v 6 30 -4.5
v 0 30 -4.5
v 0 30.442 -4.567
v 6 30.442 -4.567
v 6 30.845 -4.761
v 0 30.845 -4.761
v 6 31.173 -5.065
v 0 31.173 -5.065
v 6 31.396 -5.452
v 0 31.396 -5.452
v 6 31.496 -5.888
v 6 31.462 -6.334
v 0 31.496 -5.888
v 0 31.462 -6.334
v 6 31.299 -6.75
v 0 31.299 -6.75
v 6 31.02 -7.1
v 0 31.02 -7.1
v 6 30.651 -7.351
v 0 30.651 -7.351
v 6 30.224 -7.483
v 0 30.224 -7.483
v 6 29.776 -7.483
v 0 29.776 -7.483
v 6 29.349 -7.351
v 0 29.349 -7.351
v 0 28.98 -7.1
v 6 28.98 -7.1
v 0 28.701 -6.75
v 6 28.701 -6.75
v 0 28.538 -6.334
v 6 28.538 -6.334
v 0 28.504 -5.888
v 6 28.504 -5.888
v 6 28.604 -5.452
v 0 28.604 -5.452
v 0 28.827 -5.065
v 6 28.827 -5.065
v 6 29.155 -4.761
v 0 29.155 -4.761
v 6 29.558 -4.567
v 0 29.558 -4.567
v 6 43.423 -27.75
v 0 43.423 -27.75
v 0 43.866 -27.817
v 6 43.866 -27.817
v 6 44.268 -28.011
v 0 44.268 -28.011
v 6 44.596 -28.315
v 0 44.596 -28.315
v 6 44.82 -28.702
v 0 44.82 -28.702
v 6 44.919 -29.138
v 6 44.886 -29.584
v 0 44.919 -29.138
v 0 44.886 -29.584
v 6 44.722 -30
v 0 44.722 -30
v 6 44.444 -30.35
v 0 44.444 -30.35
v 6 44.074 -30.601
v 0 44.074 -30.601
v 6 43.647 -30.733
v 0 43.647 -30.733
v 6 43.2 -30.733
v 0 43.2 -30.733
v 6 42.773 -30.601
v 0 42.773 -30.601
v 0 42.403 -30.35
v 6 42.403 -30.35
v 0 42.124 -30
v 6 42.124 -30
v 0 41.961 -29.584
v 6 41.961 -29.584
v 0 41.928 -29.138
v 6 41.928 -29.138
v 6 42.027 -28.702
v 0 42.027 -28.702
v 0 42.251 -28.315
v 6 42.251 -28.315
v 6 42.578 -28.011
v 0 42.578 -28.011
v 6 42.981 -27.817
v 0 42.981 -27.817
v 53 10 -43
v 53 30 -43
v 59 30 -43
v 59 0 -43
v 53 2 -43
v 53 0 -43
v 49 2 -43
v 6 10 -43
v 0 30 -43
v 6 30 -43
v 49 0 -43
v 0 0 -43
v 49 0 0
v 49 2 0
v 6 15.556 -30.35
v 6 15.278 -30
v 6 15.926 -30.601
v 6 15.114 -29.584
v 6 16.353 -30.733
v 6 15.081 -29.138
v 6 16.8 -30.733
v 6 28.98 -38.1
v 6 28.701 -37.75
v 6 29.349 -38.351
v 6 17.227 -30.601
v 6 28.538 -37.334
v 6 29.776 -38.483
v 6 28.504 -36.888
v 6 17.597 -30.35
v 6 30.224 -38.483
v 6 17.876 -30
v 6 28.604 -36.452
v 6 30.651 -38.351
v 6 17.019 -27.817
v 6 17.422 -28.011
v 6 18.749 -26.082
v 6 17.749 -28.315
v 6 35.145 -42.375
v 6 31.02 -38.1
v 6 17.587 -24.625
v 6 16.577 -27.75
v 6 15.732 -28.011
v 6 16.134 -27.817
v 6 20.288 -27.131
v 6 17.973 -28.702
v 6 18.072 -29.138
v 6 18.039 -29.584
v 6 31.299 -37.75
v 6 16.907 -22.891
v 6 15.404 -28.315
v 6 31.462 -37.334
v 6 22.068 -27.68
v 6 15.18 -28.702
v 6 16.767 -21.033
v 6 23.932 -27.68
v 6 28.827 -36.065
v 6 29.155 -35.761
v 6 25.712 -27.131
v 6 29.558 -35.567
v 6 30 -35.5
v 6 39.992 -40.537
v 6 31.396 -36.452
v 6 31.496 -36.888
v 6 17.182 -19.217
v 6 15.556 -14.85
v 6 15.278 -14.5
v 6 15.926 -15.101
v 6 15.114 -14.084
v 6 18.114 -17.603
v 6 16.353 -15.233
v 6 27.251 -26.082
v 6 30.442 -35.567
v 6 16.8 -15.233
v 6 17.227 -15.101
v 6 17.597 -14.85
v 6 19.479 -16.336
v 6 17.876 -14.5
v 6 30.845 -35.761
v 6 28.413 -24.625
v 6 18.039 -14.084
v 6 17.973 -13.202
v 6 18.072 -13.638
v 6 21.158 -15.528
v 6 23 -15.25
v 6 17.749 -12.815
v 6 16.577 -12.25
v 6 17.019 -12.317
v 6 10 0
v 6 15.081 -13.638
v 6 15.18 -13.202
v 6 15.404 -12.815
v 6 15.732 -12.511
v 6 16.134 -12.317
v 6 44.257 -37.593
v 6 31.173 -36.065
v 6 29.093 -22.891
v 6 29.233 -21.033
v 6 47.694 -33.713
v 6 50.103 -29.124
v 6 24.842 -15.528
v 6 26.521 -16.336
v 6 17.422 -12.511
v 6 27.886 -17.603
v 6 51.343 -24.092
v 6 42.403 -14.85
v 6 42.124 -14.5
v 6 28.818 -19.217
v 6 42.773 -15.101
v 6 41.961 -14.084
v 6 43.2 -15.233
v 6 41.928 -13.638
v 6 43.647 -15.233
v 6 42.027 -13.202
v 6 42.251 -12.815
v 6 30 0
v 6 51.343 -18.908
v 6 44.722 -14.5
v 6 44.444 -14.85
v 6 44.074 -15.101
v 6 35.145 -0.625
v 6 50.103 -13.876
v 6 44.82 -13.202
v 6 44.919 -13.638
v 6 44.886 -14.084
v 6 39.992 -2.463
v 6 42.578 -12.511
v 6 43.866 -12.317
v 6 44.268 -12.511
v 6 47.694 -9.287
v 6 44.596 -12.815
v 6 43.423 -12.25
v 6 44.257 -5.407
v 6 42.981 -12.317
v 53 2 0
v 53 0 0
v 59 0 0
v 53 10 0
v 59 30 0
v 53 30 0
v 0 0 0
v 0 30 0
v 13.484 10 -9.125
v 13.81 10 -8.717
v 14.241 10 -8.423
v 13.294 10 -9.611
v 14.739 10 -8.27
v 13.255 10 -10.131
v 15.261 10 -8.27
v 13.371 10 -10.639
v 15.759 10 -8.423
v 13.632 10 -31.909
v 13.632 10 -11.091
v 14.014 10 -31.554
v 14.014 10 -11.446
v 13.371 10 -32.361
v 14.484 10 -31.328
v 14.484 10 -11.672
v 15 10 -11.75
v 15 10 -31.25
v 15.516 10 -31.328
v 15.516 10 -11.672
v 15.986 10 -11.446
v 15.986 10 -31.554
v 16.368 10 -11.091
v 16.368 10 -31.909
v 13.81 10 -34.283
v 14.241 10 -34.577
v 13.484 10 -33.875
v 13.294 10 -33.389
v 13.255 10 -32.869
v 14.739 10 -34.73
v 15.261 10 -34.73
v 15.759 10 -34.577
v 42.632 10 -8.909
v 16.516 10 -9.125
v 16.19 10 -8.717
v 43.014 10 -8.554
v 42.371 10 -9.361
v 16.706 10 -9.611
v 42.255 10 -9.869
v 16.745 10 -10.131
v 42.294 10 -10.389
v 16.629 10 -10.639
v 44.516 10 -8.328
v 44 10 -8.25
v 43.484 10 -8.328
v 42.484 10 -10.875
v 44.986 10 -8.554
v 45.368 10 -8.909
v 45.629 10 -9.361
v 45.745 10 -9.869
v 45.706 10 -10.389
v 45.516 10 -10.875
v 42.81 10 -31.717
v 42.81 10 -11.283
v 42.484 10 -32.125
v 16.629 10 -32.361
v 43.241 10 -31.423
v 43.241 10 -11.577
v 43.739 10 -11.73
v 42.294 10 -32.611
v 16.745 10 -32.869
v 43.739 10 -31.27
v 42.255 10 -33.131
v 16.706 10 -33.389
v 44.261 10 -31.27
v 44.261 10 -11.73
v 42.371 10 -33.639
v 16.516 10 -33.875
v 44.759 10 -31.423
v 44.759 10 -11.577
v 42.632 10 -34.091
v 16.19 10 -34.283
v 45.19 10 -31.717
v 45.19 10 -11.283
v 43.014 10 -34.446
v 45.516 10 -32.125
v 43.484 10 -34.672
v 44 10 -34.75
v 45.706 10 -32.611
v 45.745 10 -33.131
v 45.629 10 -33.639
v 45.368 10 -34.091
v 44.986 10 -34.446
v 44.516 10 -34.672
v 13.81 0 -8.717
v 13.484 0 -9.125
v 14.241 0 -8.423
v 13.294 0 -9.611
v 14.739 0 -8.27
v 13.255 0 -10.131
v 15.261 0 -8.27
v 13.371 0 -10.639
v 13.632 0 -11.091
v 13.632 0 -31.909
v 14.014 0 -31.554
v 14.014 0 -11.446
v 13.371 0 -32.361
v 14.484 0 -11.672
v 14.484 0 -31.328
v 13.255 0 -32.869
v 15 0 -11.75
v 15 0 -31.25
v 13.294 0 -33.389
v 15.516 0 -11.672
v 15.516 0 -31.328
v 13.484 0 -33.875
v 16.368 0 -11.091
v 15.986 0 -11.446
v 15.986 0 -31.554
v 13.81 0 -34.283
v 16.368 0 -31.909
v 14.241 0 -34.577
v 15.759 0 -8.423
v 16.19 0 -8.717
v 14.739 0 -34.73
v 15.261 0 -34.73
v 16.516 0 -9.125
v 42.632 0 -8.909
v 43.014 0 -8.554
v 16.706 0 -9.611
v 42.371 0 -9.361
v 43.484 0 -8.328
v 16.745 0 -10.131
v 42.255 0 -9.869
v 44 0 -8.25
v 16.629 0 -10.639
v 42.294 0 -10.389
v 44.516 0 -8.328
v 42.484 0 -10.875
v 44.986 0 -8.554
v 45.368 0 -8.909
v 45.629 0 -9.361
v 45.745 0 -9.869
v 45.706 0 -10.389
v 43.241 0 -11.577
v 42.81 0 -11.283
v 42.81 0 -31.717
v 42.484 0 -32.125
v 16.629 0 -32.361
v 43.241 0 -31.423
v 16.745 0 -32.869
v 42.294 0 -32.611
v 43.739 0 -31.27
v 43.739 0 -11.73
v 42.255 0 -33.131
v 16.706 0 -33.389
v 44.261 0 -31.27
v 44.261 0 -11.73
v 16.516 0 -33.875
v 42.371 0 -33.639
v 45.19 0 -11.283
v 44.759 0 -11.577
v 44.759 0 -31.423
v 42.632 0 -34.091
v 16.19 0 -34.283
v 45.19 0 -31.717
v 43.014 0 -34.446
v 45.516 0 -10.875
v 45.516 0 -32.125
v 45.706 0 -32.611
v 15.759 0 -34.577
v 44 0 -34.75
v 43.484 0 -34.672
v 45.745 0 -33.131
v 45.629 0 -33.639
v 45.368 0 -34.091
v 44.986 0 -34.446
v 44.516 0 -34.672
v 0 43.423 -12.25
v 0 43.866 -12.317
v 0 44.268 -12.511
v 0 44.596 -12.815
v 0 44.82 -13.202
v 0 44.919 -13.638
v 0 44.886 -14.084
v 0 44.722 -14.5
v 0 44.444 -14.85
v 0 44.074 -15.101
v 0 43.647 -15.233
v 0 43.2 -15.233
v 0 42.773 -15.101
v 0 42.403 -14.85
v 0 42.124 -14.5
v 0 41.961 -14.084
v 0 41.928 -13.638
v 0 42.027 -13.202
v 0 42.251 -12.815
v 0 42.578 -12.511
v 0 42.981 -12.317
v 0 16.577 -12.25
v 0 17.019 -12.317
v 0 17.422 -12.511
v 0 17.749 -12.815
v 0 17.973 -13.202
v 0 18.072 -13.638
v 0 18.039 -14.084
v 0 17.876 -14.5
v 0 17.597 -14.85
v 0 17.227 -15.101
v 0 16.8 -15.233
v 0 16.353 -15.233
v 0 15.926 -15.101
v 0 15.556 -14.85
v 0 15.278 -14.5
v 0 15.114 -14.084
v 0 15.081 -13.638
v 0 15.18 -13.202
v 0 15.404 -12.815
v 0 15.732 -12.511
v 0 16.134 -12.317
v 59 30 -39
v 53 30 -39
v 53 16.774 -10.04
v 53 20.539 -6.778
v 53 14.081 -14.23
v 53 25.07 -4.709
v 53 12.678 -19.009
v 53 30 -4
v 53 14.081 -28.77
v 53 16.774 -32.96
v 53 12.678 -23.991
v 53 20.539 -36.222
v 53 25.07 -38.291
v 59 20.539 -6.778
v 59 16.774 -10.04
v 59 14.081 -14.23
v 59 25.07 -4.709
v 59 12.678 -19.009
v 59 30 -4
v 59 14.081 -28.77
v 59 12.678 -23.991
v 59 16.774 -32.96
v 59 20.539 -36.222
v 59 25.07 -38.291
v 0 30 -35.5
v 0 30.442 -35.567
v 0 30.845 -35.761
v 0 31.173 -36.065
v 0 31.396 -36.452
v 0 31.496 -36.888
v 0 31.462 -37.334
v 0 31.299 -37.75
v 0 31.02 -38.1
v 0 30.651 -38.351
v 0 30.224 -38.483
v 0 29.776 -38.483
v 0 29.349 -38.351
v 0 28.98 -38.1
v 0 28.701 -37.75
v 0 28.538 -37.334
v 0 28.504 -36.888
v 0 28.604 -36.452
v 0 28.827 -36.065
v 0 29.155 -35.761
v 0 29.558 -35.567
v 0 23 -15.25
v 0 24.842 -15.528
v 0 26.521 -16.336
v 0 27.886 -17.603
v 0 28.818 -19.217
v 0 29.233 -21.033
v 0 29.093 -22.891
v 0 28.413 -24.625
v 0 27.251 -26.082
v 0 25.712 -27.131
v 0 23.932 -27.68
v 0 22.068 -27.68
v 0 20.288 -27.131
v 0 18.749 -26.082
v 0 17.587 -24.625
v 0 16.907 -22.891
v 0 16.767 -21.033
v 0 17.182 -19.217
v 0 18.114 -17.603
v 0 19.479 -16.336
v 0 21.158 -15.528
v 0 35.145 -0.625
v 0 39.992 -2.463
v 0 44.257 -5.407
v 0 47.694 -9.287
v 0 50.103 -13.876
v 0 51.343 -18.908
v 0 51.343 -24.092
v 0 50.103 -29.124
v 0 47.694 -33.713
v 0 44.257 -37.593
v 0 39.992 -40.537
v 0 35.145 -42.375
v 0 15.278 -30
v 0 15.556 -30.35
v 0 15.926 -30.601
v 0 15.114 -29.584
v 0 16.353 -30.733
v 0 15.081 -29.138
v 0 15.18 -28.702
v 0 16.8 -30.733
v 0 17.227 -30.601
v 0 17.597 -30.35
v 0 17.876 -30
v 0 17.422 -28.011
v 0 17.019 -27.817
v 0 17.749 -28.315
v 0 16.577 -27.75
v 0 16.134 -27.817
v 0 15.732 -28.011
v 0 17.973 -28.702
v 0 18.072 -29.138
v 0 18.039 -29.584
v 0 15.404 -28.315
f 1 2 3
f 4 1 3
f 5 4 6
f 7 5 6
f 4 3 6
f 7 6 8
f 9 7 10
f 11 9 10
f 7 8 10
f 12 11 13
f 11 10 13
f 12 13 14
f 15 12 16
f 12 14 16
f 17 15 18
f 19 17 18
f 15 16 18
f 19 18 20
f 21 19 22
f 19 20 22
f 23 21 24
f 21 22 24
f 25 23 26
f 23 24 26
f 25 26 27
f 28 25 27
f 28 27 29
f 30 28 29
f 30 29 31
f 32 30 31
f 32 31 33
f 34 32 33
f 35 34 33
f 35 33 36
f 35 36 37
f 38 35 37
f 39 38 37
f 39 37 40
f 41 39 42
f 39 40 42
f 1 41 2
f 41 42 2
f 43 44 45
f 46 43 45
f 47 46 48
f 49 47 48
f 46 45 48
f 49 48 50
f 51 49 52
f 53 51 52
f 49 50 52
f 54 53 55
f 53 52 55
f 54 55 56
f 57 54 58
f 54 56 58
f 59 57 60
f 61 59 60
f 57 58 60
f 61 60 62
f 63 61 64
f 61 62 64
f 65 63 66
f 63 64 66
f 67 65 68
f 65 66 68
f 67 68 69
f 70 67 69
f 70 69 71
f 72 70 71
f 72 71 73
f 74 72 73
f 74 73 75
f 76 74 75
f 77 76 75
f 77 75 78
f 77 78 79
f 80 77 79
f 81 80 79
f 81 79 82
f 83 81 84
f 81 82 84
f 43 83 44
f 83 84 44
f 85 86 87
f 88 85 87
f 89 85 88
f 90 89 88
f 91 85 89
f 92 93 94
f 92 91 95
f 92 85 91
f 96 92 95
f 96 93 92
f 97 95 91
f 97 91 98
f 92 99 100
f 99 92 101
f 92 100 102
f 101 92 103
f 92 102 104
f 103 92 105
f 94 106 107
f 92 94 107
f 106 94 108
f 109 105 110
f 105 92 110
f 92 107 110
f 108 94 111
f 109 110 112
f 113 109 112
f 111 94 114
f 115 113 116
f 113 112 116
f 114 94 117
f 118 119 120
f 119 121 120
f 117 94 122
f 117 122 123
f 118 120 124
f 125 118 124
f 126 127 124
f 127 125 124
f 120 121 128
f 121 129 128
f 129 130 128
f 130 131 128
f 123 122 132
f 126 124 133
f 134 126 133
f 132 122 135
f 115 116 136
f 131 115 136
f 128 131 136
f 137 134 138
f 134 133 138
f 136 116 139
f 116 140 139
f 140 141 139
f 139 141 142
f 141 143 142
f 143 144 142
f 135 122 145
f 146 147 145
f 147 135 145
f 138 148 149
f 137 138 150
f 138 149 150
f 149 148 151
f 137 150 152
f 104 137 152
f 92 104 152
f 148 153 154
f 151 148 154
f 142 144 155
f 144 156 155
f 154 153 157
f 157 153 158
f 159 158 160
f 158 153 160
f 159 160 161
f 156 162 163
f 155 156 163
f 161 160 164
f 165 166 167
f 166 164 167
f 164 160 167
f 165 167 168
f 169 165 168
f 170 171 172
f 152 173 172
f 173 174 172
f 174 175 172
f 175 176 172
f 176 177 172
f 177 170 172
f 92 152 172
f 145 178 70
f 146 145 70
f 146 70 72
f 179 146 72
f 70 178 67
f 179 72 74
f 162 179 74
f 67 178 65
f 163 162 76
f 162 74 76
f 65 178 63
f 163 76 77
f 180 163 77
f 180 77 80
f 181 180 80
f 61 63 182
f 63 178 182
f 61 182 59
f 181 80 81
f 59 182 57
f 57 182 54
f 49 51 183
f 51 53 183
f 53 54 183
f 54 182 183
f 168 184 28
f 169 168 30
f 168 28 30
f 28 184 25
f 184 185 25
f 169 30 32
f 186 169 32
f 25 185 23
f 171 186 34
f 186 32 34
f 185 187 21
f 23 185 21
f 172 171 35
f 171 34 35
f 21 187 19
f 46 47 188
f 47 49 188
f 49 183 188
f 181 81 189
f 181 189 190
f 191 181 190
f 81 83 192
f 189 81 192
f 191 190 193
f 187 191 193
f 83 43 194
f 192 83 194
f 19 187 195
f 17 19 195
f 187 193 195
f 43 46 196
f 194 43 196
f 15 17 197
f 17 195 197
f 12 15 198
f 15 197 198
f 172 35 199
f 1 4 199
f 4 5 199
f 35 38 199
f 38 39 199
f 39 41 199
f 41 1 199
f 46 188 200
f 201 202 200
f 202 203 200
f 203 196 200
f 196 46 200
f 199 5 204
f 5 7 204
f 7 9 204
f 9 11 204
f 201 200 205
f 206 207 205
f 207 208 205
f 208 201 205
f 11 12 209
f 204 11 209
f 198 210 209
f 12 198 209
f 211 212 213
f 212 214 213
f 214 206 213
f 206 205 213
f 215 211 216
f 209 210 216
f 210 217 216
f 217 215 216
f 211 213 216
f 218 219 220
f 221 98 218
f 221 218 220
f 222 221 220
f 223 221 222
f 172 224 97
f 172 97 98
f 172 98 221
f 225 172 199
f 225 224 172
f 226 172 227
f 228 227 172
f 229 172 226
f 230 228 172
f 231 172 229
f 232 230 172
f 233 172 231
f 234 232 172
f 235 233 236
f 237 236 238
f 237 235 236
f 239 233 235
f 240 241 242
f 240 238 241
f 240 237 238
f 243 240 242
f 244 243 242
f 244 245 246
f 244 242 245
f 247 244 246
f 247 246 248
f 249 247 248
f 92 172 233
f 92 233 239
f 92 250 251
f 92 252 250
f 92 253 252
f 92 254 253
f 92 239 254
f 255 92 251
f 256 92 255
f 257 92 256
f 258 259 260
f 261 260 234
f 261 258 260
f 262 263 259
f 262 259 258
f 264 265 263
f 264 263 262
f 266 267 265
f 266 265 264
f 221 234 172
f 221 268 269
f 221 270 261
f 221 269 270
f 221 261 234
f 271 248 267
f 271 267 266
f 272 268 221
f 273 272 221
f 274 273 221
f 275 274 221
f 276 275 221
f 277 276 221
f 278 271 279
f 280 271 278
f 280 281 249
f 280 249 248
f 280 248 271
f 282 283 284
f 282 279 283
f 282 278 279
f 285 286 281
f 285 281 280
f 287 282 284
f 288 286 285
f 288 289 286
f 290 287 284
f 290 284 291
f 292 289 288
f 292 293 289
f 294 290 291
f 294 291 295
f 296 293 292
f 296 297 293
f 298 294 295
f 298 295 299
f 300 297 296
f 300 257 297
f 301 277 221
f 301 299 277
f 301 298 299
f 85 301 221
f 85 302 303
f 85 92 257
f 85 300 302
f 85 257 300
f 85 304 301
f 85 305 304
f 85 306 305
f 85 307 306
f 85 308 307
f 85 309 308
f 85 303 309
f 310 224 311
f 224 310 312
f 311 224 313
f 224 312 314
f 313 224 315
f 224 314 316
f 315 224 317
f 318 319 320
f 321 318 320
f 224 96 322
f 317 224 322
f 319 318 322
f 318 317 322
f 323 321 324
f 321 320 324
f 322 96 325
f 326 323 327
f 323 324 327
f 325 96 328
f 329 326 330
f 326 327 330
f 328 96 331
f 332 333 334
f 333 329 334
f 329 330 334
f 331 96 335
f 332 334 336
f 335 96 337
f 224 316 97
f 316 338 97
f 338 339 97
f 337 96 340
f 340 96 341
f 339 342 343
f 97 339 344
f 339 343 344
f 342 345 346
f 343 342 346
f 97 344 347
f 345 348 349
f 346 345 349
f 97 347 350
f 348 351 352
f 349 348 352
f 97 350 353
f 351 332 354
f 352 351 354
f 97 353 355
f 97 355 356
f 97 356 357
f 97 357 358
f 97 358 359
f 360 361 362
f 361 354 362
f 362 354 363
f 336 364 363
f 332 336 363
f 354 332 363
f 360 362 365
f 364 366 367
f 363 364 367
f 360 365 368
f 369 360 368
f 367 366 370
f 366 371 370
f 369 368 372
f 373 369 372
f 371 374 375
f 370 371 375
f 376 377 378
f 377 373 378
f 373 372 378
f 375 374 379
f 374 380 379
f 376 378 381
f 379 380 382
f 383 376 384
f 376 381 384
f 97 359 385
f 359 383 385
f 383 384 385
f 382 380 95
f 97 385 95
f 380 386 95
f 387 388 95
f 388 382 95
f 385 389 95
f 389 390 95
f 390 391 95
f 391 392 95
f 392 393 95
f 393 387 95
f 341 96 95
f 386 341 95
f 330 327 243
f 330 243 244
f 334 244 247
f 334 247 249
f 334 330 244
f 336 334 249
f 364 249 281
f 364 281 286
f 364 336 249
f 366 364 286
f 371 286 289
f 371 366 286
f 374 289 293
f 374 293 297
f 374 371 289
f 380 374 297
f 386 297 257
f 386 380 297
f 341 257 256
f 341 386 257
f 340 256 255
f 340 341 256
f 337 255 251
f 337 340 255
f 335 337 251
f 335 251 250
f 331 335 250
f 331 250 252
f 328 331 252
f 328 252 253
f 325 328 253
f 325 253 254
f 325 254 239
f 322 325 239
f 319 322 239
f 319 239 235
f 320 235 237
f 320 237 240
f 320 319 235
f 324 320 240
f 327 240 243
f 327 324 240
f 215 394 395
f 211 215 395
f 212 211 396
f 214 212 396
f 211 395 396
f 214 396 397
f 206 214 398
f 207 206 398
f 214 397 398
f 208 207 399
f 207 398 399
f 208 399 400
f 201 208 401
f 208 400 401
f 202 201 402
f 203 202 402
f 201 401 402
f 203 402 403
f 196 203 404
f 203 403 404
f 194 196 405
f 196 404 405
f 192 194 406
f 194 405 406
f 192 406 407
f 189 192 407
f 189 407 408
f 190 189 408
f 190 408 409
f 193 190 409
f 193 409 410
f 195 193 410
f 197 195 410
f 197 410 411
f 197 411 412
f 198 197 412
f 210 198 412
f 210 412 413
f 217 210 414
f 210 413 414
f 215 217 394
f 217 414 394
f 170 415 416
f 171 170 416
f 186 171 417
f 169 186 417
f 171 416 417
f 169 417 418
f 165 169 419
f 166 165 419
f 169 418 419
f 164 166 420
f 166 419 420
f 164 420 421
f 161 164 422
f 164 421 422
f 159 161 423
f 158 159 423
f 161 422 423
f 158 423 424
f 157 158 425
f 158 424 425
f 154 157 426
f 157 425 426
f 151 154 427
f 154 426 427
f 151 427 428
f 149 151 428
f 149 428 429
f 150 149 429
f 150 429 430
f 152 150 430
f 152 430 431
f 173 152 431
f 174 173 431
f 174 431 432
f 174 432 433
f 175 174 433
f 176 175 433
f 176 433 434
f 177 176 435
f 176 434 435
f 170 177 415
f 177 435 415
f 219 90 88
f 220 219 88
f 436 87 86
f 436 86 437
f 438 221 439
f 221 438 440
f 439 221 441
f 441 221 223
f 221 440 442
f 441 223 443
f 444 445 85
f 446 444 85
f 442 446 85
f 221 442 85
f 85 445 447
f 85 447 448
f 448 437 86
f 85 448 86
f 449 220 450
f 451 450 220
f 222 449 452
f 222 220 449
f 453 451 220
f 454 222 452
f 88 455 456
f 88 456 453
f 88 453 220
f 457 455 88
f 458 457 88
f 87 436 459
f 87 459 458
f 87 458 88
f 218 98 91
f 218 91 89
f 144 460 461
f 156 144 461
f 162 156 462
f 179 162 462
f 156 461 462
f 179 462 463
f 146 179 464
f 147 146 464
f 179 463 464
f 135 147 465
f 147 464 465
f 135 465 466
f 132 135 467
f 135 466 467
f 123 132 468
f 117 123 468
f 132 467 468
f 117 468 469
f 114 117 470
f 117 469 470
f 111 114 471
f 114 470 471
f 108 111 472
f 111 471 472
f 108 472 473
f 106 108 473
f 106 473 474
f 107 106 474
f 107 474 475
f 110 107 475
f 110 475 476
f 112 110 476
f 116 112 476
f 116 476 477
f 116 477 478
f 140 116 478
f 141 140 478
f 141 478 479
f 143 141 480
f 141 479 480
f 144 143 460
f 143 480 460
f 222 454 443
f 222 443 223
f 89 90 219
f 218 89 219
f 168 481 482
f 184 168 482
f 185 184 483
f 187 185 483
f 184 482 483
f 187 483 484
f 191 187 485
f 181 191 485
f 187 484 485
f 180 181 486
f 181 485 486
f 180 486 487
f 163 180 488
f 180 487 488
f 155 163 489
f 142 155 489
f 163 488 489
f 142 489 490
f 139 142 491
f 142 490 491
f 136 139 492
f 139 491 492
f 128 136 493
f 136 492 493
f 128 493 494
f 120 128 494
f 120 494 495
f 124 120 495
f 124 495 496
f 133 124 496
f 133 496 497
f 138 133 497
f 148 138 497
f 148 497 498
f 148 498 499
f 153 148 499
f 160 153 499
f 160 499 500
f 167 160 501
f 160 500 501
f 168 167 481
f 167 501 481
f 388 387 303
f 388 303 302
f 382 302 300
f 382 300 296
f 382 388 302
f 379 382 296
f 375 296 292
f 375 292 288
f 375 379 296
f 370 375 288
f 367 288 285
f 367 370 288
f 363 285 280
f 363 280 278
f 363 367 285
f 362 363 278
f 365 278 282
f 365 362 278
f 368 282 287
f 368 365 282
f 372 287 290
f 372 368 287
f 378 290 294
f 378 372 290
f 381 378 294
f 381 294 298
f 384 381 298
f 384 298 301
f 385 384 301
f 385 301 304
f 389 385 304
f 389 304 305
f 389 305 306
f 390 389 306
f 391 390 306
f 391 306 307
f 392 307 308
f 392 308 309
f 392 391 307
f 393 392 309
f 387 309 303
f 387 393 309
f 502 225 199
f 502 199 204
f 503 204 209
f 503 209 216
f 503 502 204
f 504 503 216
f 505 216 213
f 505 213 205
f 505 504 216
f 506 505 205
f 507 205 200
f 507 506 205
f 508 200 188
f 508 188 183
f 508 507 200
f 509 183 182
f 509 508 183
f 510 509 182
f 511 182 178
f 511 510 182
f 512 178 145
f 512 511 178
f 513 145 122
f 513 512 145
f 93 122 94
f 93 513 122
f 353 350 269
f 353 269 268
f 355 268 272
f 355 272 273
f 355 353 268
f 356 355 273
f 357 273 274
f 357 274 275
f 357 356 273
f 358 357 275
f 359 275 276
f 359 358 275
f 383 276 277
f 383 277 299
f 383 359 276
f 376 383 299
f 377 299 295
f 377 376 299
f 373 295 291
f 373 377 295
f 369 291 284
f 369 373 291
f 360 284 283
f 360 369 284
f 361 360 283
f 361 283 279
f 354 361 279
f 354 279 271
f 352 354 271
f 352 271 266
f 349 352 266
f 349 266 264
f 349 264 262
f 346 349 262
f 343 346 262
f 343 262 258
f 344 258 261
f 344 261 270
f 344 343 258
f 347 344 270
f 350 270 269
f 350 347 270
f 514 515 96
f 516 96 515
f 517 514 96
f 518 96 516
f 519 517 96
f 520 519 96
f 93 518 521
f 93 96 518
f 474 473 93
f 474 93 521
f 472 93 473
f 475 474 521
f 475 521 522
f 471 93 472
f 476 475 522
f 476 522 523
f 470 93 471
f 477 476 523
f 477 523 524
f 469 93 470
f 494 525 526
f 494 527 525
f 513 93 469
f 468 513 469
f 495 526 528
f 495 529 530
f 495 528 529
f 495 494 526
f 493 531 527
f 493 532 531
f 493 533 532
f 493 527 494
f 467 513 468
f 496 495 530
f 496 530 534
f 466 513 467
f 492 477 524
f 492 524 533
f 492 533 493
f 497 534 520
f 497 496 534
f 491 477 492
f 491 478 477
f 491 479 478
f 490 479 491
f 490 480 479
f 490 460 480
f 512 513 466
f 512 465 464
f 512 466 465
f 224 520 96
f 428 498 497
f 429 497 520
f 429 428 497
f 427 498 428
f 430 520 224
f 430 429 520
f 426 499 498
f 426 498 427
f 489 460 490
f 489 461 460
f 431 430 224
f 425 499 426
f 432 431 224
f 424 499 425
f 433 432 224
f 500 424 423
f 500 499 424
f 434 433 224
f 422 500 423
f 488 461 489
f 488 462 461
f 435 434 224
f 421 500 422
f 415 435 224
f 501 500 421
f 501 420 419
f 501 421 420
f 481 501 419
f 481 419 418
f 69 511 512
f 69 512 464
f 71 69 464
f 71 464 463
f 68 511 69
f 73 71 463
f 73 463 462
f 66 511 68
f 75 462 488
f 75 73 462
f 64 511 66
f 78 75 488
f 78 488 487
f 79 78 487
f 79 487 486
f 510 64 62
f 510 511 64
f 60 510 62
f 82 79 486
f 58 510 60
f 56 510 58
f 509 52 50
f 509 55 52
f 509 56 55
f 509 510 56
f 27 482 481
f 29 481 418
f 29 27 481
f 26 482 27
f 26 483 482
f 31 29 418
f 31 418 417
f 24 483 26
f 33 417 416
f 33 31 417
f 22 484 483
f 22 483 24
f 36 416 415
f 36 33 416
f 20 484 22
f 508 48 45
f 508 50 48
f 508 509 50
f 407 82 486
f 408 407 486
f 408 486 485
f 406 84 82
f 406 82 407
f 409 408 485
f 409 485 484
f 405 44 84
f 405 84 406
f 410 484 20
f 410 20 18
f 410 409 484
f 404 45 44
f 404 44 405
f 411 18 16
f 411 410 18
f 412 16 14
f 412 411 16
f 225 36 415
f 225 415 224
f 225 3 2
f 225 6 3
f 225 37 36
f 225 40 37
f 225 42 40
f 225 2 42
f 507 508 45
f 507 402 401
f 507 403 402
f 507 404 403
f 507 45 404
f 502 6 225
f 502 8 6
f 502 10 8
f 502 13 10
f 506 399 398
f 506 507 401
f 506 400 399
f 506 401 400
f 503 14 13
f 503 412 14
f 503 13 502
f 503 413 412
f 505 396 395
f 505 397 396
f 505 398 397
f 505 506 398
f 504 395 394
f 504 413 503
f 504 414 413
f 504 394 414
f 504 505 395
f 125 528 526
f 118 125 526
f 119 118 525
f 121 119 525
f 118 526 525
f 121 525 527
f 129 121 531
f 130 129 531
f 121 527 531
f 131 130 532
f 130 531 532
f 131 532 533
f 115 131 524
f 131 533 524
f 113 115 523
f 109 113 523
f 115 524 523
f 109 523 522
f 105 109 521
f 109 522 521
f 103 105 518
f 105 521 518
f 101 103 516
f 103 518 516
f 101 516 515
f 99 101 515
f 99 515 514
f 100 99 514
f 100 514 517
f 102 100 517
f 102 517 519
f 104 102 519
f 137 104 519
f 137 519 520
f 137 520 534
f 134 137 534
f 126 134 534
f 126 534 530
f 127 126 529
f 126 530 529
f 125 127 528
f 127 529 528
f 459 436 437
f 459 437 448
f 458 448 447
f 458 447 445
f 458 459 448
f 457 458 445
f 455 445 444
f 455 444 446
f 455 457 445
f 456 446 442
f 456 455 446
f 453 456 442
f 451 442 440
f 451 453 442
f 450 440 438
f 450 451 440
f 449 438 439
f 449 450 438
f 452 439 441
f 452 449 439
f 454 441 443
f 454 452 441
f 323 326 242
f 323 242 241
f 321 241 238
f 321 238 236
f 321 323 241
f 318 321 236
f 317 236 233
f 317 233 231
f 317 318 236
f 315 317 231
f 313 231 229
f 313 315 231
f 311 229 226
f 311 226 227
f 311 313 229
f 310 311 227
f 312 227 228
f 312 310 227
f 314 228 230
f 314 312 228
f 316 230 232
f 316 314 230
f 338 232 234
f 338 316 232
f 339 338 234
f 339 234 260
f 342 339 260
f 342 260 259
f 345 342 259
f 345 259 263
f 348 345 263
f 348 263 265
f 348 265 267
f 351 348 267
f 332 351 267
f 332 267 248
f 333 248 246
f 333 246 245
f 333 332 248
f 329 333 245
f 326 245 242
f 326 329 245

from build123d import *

# Parameters (mm, degrees)
SKETCH1_W           = 59
SKETCH1_H           = 43
SKETCH1_R           = 1.75
BOSS_EXTRUDE1_DEPTH = 10
SKETCH2_W           = 4
SKETCH2_H           = 43
CUT_EXTRUDE1_DEPTH  = 2
BOSS_EXTRUDE2_DEPTH = 6
SKETCH5_R           = 6.25
SKETCH5_R_2         = 1.5
BOSS_EXTRUDE3_DEPTH = 6


with BuildPart() as part:
    # Sketch1 → Boss-Extrude1 (new body)
    with BuildSketch(Plane(origin=(0, 0, 0), x_dir=(1, 0, 0), z_dir=(0, 1, 0))):
        with Locations((29.5, 21.5)):
            Rectangle(SKETCH1_W, SKETCH1_H)
        with Locations(Location((15, 33, 0), (0, 0, 270))):
            Circle(SKETCH1_R, mode=Mode.SUBTRACT)
        with Locations(Location((15, 10, 0), (0, 0, 90))):
            Circle(SKETCH1_R, mode=Mode.SUBTRACT)
        with Locations(Location((44, 33, 0), (0, 0, 90))):
            Circle(SKETCH1_R, mode=Mode.SUBTRACT)
        with Locations(Location((44, 10, 0), (0, 0, 270))):
            Circle(SKETCH1_R, mode=Mode.SUBTRACT)
    extrude(amount=BOSS_EXTRUDE1_DEPTH)

    # Sketch2 → Cut-Extrude1 (cut)
    with BuildSketch(Plane.XZ):
        with Locations((51, -21.5)):
            Rectangle(SKETCH2_W, SKETCH2_H)
    extrude(amount=-CUT_EXTRUDE1_DEPTH, mode=Mode.SUBTRACT)

    # Sketch3 → Boss-Extrude2 (add)
    with BuildSketch(Plane(origin=(59, 0, 0), x_dir=(0, 0, -1), z_dir=(1, 0, 0))):
        with BuildLine():
            Line((0, 10), (43, 10))
            Line((43, 10), (43, 30))
            Line((43, 30), (39, 30))
            ThreePointArc((39, 30), (21.5, 12.5), (4, 30))
            Line((4, 30), (0, 30))
            Line((0, 30), (0, 10))
        make_face()
    extrude(amount=-BOSS_EXTRUDE2_DEPTH)

    # Sketch5 → Boss-Extrude3 (add)
    with BuildSketch(Plane.ZY):
        with BuildLine():
            Line((-43, 10), (0, 10))
            Line((0, 10), (0, 30))
            ThreePointArc((0, 30), (-21.5, 51.5), (-43, 30))
            Line((-43, 30), (-43, 10))
        make_face()
        with Locations((-21.5, 23)):
            Circle(SKETCH5_R, mode=Mode.SUBTRACT)
        with Locations((-6, 30)):
            Circle(SKETCH5_R_2, mode=Mode.SUBTRACT)
        with Locations((-13.75, 16.576606241)):
            Circle(SKETCH5_R_2, mode=Mode.SUBTRACT)
        with Locations((-29.25, 16.576606241)):
            Circle(SKETCH5_R_2, mode=Mode.SUBTRACT)
        with Locations((-37, 30)):
            Circle(SKETCH5_R_2, mode=Mode.SUBTRACT)
        with Locations((-29.25, 43.423393759)):
            Circle(SKETCH5_R_2, mode=Mode.SUBTRACT)
        with Locations((-13.75, 43.423393759)):
            Circle(SKETCH5_R_2, mode=Mode.SUBTRACT)
    extrude(amount=-BOSS_EXTRUDE3_DEPTH)


solid = part.part
